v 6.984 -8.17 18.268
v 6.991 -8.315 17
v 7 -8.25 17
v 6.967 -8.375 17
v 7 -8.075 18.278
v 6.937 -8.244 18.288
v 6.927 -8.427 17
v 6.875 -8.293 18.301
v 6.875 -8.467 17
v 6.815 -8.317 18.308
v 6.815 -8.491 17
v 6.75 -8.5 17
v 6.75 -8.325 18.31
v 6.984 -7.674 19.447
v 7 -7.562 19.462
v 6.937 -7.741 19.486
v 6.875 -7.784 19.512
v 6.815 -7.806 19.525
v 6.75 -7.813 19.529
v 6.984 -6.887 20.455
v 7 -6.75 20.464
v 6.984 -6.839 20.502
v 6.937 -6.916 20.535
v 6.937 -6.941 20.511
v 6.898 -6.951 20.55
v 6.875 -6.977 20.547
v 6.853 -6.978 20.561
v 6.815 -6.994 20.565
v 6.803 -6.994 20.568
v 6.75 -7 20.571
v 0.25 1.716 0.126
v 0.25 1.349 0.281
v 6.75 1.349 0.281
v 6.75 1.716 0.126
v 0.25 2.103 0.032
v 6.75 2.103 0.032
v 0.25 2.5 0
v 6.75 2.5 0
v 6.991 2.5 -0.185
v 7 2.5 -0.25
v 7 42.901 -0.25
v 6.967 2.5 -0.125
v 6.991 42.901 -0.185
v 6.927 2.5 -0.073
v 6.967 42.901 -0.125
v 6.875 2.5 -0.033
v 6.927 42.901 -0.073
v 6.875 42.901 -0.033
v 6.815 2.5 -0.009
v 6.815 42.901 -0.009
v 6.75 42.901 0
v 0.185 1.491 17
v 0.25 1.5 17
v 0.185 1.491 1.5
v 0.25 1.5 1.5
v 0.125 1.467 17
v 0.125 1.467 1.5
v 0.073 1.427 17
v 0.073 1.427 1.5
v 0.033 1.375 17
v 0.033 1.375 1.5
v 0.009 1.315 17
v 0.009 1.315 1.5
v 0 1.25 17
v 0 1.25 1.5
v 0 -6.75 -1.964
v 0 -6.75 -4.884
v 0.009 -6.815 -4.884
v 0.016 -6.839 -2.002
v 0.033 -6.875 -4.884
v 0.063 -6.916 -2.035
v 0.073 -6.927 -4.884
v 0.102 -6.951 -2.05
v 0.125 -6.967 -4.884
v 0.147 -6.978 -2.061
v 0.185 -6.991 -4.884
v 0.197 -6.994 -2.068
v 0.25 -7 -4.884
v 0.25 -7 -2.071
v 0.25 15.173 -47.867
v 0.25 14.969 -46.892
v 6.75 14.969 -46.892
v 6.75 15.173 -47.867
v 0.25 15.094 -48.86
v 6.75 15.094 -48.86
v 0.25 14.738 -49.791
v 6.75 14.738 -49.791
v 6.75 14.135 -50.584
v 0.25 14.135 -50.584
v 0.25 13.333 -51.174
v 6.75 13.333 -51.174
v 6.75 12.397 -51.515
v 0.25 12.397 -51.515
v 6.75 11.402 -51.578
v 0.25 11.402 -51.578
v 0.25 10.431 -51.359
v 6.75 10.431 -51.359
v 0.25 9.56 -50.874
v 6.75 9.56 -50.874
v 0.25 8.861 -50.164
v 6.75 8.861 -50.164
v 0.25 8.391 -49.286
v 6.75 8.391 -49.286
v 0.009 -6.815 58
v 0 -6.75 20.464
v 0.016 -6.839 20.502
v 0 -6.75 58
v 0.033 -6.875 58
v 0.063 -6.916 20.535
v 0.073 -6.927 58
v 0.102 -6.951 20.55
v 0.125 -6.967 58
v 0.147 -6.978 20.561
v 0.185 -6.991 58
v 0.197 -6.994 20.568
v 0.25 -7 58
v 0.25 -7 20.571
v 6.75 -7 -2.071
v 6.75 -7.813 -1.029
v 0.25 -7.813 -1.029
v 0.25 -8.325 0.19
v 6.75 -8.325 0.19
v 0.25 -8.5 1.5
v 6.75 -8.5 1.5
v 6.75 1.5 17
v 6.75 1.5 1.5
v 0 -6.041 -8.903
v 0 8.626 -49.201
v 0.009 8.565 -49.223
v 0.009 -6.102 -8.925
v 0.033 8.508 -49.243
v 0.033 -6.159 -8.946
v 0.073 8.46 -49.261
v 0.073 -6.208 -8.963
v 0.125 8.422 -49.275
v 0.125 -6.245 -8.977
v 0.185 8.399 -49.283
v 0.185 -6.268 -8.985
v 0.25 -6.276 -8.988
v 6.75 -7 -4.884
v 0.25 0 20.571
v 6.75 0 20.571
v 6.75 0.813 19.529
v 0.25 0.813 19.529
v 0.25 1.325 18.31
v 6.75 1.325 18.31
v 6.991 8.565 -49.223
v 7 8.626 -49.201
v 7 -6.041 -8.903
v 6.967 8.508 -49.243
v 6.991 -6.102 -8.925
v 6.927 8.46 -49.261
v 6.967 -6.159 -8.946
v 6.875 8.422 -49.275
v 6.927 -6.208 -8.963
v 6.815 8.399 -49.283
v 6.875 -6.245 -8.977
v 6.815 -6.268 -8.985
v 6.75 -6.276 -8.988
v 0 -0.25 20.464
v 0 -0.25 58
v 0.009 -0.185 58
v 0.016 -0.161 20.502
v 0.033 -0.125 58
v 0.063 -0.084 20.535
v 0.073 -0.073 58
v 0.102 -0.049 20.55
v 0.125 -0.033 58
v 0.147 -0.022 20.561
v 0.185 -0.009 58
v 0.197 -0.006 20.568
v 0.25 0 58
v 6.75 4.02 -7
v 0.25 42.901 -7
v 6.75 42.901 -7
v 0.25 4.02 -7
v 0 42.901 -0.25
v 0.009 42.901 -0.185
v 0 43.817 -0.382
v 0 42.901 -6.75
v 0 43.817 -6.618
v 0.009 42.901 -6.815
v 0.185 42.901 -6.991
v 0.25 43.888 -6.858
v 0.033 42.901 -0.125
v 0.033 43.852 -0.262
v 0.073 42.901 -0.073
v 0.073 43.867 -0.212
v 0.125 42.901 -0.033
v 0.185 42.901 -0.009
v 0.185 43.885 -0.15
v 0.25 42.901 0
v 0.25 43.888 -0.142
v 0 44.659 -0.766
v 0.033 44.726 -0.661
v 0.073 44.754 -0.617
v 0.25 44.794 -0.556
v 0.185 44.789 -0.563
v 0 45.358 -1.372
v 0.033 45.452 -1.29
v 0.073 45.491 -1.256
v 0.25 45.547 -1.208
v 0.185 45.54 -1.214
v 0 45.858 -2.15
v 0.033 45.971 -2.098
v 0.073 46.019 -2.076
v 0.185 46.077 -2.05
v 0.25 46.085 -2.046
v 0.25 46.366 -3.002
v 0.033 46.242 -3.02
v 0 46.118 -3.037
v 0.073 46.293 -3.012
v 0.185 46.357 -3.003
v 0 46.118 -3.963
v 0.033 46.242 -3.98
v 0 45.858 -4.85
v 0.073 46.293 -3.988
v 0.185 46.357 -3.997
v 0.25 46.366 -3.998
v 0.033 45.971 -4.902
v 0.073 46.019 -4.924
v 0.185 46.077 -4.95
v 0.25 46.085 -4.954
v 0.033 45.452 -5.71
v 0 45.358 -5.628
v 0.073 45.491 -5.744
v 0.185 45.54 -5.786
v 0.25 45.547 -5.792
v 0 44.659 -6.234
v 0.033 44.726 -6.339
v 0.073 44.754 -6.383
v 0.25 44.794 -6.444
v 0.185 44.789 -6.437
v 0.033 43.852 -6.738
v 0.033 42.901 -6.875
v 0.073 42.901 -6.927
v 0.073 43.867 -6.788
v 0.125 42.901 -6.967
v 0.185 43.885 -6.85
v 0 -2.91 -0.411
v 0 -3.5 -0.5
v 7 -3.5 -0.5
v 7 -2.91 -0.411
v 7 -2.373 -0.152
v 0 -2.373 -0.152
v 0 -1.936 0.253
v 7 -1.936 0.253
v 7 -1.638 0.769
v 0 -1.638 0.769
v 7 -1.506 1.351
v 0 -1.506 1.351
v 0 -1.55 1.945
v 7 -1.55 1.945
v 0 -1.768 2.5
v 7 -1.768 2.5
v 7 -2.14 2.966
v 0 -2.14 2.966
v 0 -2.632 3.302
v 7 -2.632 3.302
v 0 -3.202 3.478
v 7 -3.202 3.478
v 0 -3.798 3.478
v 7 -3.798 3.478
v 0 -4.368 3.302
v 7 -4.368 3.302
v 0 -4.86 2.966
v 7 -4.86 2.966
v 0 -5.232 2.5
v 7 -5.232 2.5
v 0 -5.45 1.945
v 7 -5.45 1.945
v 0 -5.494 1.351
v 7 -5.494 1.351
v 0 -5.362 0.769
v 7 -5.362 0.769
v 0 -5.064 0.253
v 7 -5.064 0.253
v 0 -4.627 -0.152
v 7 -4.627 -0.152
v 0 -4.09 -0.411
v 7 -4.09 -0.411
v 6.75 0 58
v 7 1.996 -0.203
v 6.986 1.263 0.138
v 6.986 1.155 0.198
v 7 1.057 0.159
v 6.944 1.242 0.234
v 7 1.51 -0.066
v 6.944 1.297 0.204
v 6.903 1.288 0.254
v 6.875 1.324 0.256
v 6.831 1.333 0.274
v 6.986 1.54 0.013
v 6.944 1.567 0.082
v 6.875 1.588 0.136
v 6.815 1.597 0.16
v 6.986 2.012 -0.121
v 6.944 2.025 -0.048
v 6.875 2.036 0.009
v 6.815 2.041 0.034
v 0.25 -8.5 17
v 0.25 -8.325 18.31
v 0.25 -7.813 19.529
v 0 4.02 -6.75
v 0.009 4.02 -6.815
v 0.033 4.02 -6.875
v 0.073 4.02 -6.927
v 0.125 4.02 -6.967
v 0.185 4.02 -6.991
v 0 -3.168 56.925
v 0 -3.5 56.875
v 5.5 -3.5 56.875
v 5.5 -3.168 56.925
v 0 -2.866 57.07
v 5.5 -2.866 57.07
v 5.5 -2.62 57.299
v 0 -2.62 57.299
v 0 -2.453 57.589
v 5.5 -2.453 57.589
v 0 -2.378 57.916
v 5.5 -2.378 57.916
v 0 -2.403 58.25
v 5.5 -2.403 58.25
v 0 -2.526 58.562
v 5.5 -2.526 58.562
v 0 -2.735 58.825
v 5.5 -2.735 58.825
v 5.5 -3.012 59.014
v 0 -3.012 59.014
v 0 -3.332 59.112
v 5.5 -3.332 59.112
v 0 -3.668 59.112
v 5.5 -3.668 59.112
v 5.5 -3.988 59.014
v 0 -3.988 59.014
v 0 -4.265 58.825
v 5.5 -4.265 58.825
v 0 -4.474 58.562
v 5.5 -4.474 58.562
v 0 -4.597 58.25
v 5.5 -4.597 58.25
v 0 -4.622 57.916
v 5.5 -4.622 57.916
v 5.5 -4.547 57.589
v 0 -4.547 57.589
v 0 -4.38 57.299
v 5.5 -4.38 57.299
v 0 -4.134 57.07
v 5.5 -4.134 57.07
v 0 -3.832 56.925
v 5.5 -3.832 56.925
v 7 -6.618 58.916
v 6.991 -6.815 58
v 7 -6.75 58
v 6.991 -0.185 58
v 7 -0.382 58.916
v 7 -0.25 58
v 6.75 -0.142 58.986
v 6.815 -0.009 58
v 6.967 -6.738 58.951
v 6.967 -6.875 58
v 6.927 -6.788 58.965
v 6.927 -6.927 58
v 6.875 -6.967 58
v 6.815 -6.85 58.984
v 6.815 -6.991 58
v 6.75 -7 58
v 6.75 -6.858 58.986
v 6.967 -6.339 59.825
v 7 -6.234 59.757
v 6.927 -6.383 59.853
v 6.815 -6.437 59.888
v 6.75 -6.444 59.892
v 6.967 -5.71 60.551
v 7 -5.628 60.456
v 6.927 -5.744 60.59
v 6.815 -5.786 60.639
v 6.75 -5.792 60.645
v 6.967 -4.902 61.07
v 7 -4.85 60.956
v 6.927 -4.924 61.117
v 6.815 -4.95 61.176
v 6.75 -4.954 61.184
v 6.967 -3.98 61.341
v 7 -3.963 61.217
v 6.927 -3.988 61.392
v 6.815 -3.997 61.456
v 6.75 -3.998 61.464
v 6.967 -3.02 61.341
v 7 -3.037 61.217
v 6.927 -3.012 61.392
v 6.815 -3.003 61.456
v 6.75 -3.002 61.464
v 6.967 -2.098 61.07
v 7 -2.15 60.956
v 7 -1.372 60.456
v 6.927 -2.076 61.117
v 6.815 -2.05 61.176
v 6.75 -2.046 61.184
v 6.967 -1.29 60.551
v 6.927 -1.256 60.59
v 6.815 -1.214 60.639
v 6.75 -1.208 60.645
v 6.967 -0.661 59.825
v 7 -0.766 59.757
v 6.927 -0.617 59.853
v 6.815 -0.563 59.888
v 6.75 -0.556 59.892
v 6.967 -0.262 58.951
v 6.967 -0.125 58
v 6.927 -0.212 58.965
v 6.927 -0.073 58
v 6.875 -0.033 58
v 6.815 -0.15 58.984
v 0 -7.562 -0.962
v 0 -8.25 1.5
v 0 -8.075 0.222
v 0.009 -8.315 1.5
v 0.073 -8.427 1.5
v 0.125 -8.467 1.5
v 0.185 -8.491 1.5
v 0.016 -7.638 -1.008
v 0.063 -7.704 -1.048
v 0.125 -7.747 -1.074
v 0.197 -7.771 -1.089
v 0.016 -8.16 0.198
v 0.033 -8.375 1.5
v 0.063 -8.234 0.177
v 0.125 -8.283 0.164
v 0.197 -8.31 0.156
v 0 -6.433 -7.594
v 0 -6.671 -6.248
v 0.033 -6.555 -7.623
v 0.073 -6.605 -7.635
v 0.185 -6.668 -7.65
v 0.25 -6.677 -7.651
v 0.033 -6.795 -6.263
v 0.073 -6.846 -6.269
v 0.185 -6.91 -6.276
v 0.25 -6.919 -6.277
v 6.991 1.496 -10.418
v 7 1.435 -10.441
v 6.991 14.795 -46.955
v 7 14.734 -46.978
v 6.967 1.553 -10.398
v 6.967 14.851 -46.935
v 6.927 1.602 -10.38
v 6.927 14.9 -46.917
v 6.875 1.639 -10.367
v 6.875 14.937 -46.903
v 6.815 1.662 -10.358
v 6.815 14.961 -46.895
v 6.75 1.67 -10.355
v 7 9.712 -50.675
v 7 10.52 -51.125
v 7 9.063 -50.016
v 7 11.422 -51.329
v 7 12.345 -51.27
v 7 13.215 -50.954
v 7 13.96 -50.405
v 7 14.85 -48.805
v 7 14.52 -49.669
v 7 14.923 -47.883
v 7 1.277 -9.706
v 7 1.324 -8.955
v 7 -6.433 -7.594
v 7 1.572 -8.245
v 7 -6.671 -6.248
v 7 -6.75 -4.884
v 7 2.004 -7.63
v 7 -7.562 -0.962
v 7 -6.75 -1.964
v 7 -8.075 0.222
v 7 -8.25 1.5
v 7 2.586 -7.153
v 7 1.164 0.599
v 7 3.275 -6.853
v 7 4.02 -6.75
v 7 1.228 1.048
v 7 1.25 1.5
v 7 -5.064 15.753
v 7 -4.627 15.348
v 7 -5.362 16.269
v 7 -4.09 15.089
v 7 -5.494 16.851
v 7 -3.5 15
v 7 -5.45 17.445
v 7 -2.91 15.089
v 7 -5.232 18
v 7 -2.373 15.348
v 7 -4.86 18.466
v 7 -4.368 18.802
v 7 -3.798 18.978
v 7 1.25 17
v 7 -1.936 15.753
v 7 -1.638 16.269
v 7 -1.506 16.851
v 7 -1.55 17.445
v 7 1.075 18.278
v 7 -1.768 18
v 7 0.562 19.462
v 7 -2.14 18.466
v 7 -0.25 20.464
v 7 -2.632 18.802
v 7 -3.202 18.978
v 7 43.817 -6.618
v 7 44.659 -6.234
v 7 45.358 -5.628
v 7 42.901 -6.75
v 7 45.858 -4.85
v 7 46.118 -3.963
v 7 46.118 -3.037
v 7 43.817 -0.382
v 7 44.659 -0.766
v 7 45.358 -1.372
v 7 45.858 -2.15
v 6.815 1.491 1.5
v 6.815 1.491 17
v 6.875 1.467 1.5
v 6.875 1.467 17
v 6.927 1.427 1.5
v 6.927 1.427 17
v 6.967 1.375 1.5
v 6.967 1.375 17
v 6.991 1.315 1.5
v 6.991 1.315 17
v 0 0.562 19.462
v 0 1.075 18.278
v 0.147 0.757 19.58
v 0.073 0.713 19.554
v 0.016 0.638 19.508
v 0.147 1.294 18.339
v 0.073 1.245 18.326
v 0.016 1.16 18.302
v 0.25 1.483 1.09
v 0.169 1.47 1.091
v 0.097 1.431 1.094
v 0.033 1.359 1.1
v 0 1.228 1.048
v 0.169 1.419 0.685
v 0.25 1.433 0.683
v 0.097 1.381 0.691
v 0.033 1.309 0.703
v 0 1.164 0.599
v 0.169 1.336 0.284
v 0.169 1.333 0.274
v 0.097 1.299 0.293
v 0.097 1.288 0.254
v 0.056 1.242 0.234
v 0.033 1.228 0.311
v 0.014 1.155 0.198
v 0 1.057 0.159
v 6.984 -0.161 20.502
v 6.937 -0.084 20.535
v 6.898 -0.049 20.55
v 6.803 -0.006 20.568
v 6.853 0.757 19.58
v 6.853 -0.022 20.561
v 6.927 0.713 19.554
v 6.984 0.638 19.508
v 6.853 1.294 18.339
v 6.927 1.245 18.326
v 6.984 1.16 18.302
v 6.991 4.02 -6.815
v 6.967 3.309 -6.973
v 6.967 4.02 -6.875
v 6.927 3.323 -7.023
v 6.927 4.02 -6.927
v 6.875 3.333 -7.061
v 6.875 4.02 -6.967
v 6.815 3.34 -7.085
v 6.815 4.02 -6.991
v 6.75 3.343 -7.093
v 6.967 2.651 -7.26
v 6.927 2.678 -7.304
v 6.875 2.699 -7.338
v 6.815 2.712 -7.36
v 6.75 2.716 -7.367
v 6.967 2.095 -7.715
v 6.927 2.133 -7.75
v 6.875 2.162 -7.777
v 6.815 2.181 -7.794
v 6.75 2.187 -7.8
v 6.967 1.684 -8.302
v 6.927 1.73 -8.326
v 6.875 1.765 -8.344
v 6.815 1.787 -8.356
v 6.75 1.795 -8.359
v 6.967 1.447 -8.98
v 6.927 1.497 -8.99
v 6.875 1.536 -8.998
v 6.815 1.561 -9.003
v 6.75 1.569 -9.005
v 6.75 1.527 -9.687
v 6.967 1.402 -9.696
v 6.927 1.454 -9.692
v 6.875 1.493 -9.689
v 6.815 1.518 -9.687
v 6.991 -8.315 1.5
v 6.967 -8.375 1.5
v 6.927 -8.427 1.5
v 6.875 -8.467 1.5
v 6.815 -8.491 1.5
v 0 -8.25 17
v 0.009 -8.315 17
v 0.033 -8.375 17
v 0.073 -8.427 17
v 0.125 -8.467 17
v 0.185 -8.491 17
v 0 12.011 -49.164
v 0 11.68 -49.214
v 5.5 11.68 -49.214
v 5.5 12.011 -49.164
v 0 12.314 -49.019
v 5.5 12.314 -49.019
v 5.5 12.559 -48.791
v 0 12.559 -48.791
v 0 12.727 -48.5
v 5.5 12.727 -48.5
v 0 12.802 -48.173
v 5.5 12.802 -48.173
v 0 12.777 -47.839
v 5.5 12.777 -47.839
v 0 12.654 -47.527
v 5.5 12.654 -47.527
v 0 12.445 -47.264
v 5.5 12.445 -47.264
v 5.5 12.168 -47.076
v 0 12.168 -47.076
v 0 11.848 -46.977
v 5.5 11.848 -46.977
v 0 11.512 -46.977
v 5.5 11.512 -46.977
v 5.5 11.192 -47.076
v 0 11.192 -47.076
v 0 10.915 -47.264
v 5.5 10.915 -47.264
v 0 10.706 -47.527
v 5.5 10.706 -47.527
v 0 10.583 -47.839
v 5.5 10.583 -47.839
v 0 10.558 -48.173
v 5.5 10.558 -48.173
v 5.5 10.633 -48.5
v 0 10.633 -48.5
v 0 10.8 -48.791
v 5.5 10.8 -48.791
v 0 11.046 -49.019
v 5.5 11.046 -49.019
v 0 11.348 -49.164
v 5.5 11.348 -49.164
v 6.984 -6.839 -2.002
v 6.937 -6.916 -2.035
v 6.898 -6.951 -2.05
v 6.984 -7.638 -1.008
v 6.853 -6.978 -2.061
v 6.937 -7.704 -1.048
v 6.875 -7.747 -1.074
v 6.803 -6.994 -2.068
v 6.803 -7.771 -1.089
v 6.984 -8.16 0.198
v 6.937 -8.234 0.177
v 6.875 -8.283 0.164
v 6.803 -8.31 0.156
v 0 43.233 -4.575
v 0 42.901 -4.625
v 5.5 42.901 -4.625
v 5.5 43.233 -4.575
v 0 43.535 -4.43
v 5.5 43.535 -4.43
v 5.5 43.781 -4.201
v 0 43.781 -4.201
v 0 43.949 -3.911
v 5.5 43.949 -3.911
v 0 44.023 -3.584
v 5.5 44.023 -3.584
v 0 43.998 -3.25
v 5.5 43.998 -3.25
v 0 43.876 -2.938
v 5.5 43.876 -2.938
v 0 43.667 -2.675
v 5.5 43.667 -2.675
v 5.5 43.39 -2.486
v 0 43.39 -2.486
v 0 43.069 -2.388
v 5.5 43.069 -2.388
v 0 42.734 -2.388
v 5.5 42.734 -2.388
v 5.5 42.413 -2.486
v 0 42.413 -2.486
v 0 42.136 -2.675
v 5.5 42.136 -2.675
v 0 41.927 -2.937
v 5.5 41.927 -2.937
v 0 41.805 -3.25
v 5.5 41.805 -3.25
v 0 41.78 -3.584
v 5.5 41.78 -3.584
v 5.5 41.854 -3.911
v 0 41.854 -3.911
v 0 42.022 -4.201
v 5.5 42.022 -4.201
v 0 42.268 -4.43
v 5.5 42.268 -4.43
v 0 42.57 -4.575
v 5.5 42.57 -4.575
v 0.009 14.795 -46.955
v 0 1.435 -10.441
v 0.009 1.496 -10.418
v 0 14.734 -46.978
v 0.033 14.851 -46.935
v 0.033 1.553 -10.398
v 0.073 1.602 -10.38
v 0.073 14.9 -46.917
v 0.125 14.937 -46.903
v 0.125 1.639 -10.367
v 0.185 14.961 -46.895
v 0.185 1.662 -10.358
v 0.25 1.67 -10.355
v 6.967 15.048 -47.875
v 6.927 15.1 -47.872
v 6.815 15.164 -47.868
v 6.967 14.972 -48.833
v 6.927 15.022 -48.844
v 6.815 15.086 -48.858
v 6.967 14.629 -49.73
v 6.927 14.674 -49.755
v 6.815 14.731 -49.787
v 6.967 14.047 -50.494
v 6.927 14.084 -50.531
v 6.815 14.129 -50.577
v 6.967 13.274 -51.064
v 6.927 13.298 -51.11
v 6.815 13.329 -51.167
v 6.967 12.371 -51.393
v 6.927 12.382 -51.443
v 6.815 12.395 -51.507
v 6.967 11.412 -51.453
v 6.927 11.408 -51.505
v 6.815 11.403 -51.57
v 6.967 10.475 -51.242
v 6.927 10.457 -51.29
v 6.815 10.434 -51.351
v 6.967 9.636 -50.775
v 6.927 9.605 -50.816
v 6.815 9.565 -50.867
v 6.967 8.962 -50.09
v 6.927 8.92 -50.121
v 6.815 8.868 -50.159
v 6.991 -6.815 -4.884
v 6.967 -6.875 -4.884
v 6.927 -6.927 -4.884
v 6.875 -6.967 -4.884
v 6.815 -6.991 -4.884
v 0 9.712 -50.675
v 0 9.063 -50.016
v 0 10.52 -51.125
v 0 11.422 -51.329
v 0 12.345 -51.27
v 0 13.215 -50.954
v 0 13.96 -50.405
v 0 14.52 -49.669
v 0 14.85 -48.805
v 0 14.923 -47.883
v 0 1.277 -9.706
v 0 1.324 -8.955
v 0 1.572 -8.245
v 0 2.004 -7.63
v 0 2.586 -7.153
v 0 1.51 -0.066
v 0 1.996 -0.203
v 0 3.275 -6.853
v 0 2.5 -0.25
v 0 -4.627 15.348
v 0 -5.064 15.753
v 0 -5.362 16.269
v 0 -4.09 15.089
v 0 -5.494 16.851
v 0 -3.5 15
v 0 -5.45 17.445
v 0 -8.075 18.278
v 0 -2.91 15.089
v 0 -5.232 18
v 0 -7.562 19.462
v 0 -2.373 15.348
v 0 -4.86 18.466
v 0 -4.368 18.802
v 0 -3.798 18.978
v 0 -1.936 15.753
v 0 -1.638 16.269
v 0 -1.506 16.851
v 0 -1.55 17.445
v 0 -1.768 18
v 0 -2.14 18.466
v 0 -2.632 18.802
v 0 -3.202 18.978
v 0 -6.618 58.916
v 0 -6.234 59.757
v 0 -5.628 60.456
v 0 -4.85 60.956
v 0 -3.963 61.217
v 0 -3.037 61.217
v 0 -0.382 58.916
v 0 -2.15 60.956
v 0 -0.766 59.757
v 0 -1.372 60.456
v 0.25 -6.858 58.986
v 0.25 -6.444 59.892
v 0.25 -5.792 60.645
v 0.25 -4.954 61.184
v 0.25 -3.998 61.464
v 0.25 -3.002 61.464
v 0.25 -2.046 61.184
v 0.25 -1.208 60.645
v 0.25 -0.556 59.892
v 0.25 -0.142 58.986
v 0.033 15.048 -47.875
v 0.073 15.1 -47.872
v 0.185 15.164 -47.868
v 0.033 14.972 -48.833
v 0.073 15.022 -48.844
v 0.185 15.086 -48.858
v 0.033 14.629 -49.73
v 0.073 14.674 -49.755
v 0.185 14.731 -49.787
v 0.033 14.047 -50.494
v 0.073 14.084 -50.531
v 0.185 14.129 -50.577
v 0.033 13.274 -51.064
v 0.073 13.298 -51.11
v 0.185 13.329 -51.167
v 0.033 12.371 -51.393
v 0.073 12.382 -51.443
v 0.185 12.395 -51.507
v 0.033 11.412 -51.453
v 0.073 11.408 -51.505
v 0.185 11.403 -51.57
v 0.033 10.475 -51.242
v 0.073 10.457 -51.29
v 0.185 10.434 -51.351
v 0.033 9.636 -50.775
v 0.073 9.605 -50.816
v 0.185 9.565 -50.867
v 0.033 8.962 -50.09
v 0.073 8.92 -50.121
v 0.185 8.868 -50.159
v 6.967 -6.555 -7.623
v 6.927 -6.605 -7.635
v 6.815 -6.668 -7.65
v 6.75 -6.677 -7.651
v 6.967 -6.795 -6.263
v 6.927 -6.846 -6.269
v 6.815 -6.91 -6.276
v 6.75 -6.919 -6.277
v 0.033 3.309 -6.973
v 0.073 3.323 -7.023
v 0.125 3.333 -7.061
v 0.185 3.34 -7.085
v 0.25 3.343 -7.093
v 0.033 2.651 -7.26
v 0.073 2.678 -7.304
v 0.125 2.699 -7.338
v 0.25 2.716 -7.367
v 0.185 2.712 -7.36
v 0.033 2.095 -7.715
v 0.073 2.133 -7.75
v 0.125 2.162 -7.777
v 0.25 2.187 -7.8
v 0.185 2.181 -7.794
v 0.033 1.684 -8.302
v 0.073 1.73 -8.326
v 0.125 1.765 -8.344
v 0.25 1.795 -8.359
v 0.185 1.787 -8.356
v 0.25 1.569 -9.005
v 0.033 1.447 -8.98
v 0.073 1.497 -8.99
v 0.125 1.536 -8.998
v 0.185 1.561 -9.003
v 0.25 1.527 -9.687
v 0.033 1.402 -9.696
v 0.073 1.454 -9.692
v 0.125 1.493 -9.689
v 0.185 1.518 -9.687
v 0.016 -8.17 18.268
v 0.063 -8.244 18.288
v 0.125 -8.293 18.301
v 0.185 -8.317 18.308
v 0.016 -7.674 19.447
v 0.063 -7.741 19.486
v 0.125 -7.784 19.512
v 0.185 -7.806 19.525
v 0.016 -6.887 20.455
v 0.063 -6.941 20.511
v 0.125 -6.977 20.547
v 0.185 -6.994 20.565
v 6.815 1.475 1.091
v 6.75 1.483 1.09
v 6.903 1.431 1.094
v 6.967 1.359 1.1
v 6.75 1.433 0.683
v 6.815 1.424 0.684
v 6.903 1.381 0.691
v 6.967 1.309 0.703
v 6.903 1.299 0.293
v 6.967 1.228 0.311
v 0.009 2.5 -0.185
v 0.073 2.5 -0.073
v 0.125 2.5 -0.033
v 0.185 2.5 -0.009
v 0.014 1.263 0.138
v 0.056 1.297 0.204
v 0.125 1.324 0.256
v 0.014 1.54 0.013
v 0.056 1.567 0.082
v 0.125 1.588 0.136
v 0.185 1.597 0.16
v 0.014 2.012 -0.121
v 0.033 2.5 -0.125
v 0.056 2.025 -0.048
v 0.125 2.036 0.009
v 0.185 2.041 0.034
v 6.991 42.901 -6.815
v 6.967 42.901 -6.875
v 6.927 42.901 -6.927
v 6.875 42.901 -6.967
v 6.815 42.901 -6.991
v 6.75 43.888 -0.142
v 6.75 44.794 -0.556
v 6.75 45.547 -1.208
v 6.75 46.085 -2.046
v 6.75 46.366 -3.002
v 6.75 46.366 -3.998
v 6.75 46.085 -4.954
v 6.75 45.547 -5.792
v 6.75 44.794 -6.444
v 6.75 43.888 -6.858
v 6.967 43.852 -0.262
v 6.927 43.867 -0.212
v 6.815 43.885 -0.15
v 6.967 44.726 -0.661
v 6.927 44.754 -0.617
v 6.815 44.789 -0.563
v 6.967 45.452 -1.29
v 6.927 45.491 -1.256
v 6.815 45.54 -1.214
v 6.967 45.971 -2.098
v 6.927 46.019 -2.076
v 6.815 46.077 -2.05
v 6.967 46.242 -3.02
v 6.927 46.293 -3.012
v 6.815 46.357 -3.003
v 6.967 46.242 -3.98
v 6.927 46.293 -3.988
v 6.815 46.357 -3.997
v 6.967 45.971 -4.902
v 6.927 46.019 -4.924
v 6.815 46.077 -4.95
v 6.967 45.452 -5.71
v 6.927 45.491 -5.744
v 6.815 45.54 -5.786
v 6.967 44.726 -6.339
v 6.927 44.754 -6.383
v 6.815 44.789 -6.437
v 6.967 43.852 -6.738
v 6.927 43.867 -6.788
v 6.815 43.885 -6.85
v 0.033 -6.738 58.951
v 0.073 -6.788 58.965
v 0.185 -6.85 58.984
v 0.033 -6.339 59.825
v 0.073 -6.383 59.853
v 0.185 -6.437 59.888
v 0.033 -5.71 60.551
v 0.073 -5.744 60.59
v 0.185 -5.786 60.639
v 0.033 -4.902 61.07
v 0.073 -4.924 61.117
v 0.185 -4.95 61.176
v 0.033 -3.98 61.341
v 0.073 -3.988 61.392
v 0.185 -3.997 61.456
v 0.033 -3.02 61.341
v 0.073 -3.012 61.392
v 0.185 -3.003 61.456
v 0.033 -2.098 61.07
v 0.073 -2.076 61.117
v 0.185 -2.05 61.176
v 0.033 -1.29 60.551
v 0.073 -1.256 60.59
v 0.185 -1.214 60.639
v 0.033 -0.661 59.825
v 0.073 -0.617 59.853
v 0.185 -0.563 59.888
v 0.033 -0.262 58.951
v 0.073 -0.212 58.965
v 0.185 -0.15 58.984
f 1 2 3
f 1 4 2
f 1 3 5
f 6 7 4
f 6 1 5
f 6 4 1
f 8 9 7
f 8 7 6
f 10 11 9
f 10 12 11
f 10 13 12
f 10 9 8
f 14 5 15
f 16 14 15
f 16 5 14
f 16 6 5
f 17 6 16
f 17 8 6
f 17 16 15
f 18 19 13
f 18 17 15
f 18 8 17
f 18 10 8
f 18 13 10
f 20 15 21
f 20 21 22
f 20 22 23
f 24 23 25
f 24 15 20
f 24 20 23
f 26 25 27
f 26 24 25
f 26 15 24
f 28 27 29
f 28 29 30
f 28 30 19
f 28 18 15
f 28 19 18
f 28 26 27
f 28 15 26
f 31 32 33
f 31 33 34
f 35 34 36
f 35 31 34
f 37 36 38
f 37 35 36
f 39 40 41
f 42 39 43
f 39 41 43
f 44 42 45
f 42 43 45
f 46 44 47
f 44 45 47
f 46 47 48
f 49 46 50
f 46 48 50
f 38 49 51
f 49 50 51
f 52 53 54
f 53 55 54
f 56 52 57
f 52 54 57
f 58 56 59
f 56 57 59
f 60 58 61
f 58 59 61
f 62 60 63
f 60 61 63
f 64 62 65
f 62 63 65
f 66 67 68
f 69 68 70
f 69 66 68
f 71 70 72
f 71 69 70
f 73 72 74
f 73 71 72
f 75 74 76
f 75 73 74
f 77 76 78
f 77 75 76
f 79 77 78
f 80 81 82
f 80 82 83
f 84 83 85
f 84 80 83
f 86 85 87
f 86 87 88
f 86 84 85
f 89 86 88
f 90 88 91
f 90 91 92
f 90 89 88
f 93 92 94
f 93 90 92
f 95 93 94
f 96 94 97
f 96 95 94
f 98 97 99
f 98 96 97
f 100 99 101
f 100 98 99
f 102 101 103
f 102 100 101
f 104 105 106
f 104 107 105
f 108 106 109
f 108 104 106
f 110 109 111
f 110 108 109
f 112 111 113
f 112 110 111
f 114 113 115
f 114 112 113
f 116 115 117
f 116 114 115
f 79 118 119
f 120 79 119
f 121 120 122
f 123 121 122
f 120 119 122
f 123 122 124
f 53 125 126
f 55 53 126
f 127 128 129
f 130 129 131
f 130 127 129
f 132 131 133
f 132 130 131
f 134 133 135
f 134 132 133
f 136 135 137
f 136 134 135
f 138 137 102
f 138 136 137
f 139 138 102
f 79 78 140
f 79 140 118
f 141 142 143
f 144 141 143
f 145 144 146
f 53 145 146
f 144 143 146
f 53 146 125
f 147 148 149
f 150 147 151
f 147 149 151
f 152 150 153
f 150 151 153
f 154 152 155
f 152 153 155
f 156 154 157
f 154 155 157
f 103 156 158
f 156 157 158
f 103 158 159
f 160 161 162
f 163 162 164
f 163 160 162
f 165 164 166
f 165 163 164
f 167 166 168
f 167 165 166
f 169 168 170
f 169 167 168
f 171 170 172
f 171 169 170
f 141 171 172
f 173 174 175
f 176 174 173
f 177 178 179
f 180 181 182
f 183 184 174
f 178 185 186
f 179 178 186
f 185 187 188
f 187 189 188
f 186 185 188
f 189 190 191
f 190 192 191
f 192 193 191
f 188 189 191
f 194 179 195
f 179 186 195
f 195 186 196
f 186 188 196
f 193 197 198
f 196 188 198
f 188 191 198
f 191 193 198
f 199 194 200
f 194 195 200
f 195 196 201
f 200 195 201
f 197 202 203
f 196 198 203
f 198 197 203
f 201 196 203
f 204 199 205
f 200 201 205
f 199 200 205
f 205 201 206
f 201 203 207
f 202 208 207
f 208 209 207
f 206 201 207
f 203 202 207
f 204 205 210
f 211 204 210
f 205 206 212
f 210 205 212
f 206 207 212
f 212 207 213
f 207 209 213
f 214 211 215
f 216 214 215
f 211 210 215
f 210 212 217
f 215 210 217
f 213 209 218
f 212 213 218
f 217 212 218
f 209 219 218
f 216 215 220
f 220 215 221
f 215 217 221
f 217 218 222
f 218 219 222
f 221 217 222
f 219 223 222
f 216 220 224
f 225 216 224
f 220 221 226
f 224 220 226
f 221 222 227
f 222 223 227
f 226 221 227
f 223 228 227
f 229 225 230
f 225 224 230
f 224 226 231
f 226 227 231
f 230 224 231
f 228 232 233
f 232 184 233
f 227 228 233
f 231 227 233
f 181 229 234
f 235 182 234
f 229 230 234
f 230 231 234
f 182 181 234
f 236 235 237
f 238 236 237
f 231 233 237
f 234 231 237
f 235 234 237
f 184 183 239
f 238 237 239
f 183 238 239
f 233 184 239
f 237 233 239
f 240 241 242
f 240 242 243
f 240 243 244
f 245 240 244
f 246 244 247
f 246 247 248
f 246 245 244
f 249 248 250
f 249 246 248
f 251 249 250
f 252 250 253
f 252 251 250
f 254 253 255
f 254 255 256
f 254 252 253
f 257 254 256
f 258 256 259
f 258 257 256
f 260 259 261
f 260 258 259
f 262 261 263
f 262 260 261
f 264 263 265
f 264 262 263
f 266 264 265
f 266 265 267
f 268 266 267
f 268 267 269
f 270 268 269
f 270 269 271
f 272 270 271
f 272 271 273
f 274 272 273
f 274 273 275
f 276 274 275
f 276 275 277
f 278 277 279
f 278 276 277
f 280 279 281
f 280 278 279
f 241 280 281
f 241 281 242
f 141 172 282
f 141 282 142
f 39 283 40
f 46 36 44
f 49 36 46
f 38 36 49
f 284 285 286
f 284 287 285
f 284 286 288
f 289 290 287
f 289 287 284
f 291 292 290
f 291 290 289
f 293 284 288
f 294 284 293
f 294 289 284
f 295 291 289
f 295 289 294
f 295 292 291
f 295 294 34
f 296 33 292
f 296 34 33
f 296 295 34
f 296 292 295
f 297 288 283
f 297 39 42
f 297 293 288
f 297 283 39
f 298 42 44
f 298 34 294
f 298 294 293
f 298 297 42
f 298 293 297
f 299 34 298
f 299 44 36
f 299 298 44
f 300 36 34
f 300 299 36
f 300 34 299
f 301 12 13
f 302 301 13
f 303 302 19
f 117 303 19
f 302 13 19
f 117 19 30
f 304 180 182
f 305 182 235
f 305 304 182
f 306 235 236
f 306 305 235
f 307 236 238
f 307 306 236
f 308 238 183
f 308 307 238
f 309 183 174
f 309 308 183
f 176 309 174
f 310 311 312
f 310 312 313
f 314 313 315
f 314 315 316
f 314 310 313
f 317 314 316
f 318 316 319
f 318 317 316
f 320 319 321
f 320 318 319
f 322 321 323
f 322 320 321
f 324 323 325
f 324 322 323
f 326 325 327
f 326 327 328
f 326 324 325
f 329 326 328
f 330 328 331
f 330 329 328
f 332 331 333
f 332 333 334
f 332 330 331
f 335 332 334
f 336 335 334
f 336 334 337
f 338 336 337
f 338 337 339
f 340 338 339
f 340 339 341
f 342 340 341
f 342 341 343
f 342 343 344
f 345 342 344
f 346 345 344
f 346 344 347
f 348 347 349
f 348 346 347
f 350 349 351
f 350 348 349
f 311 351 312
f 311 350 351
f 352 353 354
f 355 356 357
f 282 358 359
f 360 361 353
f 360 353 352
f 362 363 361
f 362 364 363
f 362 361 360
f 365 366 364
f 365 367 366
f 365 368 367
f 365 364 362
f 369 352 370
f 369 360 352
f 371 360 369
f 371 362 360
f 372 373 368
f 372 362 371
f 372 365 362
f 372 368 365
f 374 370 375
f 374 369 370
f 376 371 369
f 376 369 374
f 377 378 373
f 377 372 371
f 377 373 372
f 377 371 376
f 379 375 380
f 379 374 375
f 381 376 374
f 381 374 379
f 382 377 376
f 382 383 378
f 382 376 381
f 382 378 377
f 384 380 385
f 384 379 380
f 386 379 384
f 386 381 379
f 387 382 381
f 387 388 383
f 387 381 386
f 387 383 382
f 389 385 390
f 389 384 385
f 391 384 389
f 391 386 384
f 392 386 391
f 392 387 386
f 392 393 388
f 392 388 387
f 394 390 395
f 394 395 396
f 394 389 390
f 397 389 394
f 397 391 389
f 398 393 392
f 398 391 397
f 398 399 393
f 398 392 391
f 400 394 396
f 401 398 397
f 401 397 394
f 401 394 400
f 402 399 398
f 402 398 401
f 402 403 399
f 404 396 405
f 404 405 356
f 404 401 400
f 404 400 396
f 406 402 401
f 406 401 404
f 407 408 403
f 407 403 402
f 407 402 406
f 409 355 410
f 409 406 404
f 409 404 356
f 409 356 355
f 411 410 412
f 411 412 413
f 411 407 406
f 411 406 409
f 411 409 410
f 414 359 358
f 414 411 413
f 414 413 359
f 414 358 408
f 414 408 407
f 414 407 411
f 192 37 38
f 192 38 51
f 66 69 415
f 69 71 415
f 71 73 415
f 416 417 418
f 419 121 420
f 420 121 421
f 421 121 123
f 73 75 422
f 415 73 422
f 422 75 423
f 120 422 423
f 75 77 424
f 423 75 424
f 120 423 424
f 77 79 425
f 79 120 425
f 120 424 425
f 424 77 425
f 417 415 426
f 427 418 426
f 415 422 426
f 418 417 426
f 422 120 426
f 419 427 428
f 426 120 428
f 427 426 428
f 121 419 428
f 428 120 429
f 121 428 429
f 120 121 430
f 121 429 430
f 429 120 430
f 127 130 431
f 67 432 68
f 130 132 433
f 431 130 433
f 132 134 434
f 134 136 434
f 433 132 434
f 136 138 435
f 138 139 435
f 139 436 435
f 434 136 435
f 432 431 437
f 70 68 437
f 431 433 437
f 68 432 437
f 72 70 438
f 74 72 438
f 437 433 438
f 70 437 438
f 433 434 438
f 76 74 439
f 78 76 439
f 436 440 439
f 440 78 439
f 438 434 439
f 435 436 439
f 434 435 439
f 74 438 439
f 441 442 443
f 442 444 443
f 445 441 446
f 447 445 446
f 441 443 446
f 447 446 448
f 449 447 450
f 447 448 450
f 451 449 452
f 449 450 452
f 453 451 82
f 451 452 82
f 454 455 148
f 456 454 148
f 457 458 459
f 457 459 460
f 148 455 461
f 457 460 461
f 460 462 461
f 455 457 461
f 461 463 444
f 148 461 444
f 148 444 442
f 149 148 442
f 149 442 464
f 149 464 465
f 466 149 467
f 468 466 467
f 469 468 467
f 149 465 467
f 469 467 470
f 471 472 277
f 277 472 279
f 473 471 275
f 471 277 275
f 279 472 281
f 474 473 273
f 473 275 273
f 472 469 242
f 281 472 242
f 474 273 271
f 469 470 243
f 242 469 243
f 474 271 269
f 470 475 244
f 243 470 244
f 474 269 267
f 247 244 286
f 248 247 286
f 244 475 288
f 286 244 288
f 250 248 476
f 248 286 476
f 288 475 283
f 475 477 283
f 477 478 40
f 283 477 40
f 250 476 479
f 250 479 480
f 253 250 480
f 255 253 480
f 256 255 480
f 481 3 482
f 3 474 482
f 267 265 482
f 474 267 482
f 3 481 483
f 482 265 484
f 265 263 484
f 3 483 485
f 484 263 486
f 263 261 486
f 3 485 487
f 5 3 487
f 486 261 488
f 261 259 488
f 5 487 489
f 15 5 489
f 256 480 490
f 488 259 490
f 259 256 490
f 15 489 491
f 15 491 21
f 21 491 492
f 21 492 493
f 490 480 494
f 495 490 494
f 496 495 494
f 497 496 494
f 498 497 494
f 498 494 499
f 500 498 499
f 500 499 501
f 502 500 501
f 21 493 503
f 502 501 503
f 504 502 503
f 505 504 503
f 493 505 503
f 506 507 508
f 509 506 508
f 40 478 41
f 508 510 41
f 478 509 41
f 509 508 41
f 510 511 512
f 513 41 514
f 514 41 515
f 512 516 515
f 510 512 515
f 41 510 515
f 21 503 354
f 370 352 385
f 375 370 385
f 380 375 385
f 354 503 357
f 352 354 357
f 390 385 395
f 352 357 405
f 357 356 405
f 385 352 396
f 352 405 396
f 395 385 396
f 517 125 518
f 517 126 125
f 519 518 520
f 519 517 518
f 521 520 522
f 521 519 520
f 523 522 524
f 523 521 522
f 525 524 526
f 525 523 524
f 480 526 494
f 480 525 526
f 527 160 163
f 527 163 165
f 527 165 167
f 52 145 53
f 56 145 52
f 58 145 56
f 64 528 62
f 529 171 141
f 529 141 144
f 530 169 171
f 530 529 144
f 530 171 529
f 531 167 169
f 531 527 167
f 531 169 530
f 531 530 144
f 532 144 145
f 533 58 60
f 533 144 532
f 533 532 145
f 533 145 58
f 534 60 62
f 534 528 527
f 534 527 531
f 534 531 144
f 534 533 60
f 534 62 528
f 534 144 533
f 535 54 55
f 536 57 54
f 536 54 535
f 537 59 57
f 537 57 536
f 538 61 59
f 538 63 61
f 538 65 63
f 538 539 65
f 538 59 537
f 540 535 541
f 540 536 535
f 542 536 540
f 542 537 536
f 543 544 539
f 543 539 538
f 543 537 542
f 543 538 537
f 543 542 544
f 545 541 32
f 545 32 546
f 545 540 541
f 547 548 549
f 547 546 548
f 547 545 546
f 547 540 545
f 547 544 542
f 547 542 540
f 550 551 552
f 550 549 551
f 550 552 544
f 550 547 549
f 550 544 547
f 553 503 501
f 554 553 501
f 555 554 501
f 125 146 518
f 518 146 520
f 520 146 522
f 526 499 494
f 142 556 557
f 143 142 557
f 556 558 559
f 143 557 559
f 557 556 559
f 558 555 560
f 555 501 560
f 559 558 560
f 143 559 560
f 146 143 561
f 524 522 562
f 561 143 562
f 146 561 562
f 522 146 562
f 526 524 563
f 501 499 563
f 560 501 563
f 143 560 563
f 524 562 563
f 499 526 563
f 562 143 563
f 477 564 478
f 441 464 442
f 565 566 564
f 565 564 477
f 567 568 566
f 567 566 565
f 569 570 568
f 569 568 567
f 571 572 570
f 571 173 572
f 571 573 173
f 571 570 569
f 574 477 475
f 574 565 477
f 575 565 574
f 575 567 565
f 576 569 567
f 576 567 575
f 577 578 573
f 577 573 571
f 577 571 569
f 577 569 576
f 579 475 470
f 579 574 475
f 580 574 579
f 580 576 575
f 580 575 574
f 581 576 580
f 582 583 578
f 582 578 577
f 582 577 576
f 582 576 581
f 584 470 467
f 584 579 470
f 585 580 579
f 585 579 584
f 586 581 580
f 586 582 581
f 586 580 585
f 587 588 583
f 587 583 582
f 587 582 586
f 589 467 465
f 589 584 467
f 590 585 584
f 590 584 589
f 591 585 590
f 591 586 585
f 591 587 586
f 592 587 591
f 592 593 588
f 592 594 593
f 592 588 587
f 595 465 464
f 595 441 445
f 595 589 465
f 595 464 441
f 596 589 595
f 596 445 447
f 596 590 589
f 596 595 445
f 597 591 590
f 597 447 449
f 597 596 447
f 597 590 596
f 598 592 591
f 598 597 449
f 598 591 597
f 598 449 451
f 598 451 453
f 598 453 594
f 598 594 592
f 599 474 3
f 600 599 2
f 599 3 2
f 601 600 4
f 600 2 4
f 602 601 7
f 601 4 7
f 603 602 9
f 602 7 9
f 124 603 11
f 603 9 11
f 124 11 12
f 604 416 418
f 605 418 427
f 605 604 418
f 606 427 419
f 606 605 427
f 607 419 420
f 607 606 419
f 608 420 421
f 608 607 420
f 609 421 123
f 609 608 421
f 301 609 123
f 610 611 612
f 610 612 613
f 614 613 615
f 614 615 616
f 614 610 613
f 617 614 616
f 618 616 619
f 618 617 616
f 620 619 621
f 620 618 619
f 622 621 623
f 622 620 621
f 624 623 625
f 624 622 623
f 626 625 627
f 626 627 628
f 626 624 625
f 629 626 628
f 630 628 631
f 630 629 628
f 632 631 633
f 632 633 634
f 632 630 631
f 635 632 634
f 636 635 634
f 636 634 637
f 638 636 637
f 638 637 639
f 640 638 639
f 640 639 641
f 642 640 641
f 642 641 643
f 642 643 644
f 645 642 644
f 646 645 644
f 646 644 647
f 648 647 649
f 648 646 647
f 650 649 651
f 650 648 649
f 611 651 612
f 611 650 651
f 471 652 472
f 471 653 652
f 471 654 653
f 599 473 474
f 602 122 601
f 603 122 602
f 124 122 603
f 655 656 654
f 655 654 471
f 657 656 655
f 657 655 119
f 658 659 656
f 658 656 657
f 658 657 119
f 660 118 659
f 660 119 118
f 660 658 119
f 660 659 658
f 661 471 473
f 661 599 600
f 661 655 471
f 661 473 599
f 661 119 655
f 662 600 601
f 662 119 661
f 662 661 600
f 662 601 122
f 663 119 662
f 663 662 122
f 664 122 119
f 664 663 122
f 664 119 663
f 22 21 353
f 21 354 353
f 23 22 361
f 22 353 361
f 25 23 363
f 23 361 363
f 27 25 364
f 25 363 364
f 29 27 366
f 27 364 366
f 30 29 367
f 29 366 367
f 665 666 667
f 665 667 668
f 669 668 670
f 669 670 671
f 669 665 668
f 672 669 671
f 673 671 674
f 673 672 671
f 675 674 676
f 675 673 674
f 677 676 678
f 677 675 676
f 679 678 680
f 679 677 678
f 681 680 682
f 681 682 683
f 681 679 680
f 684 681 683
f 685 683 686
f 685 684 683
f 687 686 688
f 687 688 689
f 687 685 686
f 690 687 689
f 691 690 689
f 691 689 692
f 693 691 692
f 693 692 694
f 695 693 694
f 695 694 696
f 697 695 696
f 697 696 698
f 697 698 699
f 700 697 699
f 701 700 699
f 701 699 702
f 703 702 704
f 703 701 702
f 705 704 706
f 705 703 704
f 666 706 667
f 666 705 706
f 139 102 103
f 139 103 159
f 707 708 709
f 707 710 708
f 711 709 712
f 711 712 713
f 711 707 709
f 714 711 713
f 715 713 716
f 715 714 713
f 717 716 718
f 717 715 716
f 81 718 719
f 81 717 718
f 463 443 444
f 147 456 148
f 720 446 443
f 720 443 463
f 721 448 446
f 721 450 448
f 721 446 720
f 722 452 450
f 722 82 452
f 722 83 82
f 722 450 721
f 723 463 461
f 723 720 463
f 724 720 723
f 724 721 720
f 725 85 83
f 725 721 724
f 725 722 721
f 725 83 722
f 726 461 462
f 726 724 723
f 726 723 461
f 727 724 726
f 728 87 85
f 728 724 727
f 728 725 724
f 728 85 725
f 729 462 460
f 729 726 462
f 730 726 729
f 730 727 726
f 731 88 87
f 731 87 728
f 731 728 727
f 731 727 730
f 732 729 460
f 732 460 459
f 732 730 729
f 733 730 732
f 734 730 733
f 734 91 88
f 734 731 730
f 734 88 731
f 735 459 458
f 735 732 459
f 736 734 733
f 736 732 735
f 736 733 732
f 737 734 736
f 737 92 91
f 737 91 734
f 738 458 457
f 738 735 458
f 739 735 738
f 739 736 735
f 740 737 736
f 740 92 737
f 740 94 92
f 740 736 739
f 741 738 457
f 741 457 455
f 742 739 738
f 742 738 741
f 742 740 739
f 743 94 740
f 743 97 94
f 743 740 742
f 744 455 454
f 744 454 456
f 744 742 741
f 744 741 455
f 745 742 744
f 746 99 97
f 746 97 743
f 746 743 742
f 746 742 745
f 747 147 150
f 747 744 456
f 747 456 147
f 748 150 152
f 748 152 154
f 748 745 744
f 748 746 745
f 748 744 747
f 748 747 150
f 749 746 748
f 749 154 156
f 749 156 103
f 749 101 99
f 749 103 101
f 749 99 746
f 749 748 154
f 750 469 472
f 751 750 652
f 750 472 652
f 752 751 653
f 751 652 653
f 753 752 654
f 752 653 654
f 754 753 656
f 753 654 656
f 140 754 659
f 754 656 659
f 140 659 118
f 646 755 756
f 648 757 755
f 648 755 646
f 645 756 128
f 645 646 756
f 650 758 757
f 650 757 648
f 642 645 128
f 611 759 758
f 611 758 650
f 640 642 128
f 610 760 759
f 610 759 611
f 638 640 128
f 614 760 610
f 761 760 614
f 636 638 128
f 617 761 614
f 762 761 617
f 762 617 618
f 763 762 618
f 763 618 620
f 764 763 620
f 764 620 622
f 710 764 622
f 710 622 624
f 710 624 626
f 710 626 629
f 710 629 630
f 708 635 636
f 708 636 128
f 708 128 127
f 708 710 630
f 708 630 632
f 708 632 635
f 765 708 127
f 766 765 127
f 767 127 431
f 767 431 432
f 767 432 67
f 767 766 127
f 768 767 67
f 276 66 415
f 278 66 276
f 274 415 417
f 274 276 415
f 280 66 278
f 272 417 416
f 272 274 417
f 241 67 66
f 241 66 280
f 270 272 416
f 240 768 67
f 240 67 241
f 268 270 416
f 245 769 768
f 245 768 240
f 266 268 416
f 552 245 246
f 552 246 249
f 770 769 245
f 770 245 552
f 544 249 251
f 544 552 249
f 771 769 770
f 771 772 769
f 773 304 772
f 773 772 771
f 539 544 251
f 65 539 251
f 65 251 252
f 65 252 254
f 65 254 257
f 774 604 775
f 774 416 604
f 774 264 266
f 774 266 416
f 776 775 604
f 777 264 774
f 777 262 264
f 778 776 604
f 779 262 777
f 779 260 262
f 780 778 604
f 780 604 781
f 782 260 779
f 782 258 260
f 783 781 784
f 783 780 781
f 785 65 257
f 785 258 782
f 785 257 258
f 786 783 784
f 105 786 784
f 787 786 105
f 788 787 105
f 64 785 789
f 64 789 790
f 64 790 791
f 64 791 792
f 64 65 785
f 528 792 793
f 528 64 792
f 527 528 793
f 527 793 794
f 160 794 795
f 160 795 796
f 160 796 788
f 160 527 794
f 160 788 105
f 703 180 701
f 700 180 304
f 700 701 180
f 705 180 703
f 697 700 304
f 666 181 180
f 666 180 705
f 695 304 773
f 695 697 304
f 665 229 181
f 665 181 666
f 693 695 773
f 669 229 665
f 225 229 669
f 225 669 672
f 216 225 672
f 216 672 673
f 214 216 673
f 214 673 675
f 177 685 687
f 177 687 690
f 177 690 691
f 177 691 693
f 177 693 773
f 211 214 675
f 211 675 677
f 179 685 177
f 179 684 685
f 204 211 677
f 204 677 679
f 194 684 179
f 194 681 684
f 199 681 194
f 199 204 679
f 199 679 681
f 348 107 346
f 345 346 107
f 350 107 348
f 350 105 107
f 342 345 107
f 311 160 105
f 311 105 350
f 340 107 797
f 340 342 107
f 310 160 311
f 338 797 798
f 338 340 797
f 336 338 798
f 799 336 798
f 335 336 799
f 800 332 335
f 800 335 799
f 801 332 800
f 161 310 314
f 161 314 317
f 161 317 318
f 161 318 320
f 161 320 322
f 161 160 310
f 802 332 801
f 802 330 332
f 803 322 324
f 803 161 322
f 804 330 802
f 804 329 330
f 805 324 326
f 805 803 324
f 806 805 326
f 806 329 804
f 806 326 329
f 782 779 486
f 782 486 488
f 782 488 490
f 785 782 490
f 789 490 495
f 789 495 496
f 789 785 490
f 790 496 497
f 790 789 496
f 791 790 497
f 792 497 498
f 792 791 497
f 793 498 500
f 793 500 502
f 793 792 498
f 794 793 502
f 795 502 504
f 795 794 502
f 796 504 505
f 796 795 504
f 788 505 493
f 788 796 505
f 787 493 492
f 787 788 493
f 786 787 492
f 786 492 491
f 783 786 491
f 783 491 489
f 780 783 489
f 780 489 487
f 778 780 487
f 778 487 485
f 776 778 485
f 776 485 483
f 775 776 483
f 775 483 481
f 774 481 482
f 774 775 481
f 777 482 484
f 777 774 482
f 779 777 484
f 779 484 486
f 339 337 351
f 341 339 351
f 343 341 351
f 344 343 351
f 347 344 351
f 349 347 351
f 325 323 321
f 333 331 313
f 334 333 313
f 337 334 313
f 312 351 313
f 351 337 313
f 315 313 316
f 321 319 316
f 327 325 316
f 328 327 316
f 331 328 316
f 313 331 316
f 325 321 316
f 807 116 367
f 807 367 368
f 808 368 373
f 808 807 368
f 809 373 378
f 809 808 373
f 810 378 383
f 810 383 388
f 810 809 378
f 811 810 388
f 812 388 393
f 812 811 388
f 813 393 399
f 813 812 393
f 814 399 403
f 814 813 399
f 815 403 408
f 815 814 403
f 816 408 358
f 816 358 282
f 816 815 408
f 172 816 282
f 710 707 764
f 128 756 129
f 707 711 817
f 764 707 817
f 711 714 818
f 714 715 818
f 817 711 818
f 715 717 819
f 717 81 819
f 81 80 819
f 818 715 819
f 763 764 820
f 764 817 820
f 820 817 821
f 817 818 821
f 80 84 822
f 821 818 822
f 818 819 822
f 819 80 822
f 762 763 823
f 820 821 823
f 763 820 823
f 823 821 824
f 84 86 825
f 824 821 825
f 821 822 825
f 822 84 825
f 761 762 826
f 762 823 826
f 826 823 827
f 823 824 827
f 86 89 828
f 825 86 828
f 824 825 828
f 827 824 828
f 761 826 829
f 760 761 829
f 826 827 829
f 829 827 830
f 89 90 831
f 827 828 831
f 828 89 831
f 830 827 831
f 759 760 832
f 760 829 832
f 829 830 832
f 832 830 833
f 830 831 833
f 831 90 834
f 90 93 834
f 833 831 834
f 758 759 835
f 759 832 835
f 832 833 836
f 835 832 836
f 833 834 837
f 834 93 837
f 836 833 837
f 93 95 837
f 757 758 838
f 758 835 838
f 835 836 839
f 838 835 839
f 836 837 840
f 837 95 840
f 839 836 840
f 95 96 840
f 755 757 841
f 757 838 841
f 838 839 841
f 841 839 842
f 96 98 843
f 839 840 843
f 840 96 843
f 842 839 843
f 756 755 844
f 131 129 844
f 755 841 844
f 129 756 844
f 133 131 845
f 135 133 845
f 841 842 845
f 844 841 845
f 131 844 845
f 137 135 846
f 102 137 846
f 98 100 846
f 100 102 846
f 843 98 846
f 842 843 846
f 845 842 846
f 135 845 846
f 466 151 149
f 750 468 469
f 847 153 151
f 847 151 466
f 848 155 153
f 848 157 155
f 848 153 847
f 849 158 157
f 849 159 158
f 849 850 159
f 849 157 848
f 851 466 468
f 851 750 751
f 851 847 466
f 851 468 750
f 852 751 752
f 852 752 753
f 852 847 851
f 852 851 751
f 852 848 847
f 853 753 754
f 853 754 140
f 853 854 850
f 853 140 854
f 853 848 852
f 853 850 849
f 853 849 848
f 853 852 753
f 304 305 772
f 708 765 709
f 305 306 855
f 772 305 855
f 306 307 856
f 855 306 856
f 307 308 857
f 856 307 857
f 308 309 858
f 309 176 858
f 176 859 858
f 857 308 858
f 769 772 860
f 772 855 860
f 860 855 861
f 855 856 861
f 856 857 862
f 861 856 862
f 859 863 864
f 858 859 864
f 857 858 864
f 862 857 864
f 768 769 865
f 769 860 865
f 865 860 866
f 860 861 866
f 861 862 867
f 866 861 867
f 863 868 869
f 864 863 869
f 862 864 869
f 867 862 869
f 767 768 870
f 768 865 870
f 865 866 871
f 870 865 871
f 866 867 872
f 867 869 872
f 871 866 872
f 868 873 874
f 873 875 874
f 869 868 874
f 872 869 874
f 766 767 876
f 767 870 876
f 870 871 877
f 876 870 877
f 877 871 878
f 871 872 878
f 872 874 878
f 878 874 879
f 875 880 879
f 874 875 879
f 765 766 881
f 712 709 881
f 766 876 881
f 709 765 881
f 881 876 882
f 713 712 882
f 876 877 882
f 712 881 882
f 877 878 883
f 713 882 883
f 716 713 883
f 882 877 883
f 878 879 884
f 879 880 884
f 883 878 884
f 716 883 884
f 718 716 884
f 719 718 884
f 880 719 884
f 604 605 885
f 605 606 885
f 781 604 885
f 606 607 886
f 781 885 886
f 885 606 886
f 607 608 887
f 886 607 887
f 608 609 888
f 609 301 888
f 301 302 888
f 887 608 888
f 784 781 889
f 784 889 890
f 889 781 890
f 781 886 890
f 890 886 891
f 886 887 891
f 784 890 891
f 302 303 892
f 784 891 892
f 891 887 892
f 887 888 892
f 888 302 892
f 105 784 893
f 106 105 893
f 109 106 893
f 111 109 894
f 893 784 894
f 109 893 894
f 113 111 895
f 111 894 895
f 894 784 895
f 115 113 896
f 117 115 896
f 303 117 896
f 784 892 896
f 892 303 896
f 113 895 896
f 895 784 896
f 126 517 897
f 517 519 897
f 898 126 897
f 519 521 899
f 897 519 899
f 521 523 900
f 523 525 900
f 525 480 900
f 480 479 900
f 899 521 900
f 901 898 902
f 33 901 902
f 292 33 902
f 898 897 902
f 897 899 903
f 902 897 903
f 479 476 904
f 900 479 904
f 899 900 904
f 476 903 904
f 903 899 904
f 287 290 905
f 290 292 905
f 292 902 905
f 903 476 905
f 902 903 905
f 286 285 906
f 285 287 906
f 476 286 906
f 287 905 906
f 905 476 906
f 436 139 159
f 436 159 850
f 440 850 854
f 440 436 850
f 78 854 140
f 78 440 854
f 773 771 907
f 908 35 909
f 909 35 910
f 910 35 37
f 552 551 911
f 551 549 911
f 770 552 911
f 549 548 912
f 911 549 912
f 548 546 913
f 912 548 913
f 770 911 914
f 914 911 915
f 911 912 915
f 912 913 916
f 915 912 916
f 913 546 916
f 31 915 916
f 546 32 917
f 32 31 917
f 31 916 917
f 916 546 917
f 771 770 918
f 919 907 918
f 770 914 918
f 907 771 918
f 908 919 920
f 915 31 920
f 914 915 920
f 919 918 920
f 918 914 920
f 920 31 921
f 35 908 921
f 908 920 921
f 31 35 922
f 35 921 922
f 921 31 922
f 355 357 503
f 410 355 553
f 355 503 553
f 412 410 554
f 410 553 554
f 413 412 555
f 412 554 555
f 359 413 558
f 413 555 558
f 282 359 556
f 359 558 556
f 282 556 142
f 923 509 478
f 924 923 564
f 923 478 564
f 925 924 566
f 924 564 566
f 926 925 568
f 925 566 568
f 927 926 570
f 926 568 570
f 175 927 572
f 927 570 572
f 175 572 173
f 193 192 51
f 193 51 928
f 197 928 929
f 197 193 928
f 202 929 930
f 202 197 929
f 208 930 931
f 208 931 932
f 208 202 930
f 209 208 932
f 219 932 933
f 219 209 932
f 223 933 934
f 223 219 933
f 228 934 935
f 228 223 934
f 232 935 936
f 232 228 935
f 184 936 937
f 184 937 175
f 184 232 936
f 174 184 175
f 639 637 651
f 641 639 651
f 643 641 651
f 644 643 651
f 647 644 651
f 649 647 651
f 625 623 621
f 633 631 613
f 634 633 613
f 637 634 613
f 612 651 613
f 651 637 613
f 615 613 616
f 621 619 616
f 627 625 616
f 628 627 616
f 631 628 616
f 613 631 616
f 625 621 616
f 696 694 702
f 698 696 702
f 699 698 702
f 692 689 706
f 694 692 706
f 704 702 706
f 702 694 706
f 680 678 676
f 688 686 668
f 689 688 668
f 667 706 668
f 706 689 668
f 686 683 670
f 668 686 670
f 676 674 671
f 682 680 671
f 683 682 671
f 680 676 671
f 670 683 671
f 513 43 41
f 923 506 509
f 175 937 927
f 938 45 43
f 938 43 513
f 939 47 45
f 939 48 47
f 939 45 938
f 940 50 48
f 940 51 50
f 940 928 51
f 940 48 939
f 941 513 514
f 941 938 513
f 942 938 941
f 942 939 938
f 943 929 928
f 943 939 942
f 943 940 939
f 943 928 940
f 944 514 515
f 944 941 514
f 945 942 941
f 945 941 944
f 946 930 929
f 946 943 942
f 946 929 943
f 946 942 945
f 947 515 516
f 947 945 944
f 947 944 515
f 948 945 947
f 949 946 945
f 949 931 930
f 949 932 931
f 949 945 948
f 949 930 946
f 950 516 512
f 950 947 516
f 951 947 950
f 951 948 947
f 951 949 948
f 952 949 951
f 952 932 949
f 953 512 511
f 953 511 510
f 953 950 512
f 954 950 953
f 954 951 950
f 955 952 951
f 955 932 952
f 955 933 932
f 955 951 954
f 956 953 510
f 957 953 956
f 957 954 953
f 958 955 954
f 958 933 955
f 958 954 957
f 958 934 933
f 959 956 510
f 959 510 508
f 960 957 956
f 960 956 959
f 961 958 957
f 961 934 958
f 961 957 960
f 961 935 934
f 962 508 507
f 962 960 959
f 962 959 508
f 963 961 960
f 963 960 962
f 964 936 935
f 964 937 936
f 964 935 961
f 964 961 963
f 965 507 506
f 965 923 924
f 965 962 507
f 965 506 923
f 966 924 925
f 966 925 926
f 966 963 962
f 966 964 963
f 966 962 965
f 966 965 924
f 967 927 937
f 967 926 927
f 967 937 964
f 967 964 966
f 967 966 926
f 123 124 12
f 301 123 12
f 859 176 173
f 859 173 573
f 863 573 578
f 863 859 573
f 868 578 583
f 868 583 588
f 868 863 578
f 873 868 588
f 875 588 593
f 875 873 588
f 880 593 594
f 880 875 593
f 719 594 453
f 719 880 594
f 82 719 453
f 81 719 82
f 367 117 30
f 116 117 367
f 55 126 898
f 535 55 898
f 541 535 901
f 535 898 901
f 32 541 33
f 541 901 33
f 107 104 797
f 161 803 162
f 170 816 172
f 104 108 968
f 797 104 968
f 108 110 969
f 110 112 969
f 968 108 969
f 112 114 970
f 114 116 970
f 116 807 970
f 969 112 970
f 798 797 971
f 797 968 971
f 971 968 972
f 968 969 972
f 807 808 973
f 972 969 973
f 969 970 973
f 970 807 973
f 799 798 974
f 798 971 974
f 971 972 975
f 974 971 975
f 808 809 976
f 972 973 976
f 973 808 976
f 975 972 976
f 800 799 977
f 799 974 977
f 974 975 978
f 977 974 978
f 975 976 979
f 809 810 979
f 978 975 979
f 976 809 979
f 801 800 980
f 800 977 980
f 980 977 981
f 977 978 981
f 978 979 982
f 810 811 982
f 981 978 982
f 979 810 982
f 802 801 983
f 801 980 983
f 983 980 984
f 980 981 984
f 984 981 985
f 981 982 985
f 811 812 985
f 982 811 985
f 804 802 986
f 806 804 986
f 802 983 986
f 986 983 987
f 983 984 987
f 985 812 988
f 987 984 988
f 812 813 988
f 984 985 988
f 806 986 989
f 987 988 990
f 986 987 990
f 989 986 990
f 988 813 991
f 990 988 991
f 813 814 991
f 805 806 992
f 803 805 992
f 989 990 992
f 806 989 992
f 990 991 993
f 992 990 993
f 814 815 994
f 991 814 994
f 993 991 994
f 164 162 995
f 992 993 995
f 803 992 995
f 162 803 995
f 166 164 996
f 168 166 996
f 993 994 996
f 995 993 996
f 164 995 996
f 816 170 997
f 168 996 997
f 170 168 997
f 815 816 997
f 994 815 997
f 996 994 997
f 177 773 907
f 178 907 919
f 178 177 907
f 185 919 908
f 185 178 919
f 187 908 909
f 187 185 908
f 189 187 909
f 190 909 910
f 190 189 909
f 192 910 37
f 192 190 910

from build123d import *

# Parameters (mm, degrees)
BOSS_EXTRUDE1_DEPTH = 7
BOSS_EXTRUDE2_DEPTH = 7
FILLET1_R           = 0.25
SKETCH4_R           = 2
CUT_EXTRUDE2_DEPTH  = 7
SKETCH3_R           = 1.125
CUT_EXTRUDE1_DEPTH  = 5.5


with BuildPart() as part:
    # Sketch1 → Boss-Extrude1 (new body)
    with BuildSketch(Plane(origin=(0, 0, 0), x_dir=(0, 0, -1), z_dir=(1, 0, 0))):
        with BuildLine():
            Line((-58, 0), (-2.5, 0))
            ThreePointArc((-2.5, 0), (-0.732233047, 0.732233047), (0, 2.5))
            Line((0, 2.5), (0, 42.901452767))
            ThreePointArc((0, 42.901452767), (3.5, 46.401452767), (7, 42.901452767))
            Line((7, 42.901452767), (7, 4.019614424))
            ThreePointArc((7, 4.019614424), (8.066058909, 1.971734313), (10.355050358, 1.670382872))
            Line((10.355050358, 1.670382872), (46.892026932, 14.968754795))
            ThreePointArc((46.892026932, 14.968754795), (51.378021606, 12.876901124), (49.286167935, 8.39090645))
            Line((49.286167935, 8.39090645), (8.988317951, -6.276311449))
            ThreePointArc((8.988317951, -6.276311449), (6.967854364, -6.817693036), (4.884076231, -7))
            Line((4.884076231, -7), (-58, -7))
            ThreePointArc((-58, -7), (-61.5, -3.5), (-58, 0))
        make_face()
    extrude(amount=BOSS_EXTRUDE1_DEPTH)

    # Sketch2 → Boss-Extrude2 (add)
    with BuildSketch(Plane(origin=(7, 0, 0), x_dir=(0, 0, -1), z_dir=(1, 0, 0))):
        with BuildLine():
            Line((-17, 1.5), (-1.5, 1.5))
            ThreePointArc((-1.5, 1.5), (3.5, -3.5), (-1.5, -8.5))
            Line((-1.5, -8.5), (-17, -8.5))
            ThreePointArc((-17, -8.5), (-22, -3.5), (-17, 1.5))
        make_face()
    extrude(amount=-BOSS_EXTRUDE2_DEPTH)

    # Fillet1
    fillet1_edges = [part.edges().sort_by_distance(p)[0] for p in [
        (7, -6.817693036, -6.967854364),
        (0, 1.907658596, 0.071187191),
        (0, 22.700726384, 0),
        (0, 46.401452767, -3.5),
        (0, 23.460533596, -7),
        (0, 1.971734313, -8.066058909),
        (7, 1.0572975, -29.137242943),
        (0, 8.319568834, -28.623538645),
        (0, 12.876901124, -51.378021606),
        (0, 1.0572975, -29.137242943),
        (0, -6.817693036, -6.967854364),
        (0, -7, 39.285357107),
        (0, -3.5, 61.5),
        (7, 12.876901124, -51.378021606),
        (7, 8.319568834, -28.623538645),
        (7, 1.971734313, -8.066058909),
        (7, 23.460533596, -7),
        (7, 46.401452767, -3.5),
        (7, 22.700726384, 0),
        (7, 1.907658596, 0.071187191),
        (0, 0, 39.285357107),
        (0, -7, -3.477395223),
        (7, -7, -3.477395223),
        (7, 0, 39.285357107),
        (7, -3.5, 61.5),
        (7, -8.109772229, 18.936491673),
        (7, -8.5, 9.25),
        (7, -8.109772229, -0.436491673),
        (7, 1.462119227, 0.885693253),
        (7, 1.5, 9.25),
        (7, 1.109772229, 18.936491673),
        (0, -8.109772229, 18.936491673),
        (0, -8.109772229, -0.436491673),
        (0, -8.5, 9.25),
        (0, 1.462119227, 0.885693253),
        (0, 1.109772229, 18.936491673),
        (0, 1.5, 9.25),
        (7, -7, 39.285357107),
    ]]
    fillet(fillet1_edges, radius=FILLET1_R)

    # Sketch4 → Cut-Extrude2 (cut)
    with BuildSketch(Plane(origin=(0, 0, 0), x_dir=(0, 0, -1), z_dir=(1, 0, 0))):
        with Locations((-17, -3.5)):
            Circle(SKETCH4_R)
        with Locations((-1.5, -3.5)):
            Circle(SKETCH4_R)
    extrude(amount=CUT_EXTRUDE2_DEPTH, mode=Mode.SUBTRACT)

    # Sketch3 → Cut-Extrude1 (cut)
    with BuildSketch(Plane(origin=(0, 0, 0), x_dir=(0, 0, -1), z_dir=(1, 0, 0))):
        with Locations((3.5, 42.901452767)):
            Circle(SKETCH3_R)
        with Locations((48.089097434, 11.679830622)):
            Circle(SKETCH3_R)
        with Locations((-58, -3.5)):
            Circle(SKETCH3_R)
    extrude(amount=CUT_EXTRUDE1_DEPTH, mode=Mode.SUBTRACT)


solid = part.part
